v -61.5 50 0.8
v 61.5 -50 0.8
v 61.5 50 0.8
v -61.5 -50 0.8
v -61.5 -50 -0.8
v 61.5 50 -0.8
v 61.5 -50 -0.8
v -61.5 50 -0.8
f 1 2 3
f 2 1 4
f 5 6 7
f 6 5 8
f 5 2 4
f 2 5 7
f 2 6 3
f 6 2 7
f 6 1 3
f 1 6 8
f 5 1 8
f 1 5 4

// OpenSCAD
$fn=64;

board_x = 123.0;
board_y = 100.0;
board_t = 1.6;

module control_board(x=board_x, y=board_y, t=board_t){
    translate([-x/2, -y/2, -t/2])
        cube([x, y, t], center=false);
}

control_board();
